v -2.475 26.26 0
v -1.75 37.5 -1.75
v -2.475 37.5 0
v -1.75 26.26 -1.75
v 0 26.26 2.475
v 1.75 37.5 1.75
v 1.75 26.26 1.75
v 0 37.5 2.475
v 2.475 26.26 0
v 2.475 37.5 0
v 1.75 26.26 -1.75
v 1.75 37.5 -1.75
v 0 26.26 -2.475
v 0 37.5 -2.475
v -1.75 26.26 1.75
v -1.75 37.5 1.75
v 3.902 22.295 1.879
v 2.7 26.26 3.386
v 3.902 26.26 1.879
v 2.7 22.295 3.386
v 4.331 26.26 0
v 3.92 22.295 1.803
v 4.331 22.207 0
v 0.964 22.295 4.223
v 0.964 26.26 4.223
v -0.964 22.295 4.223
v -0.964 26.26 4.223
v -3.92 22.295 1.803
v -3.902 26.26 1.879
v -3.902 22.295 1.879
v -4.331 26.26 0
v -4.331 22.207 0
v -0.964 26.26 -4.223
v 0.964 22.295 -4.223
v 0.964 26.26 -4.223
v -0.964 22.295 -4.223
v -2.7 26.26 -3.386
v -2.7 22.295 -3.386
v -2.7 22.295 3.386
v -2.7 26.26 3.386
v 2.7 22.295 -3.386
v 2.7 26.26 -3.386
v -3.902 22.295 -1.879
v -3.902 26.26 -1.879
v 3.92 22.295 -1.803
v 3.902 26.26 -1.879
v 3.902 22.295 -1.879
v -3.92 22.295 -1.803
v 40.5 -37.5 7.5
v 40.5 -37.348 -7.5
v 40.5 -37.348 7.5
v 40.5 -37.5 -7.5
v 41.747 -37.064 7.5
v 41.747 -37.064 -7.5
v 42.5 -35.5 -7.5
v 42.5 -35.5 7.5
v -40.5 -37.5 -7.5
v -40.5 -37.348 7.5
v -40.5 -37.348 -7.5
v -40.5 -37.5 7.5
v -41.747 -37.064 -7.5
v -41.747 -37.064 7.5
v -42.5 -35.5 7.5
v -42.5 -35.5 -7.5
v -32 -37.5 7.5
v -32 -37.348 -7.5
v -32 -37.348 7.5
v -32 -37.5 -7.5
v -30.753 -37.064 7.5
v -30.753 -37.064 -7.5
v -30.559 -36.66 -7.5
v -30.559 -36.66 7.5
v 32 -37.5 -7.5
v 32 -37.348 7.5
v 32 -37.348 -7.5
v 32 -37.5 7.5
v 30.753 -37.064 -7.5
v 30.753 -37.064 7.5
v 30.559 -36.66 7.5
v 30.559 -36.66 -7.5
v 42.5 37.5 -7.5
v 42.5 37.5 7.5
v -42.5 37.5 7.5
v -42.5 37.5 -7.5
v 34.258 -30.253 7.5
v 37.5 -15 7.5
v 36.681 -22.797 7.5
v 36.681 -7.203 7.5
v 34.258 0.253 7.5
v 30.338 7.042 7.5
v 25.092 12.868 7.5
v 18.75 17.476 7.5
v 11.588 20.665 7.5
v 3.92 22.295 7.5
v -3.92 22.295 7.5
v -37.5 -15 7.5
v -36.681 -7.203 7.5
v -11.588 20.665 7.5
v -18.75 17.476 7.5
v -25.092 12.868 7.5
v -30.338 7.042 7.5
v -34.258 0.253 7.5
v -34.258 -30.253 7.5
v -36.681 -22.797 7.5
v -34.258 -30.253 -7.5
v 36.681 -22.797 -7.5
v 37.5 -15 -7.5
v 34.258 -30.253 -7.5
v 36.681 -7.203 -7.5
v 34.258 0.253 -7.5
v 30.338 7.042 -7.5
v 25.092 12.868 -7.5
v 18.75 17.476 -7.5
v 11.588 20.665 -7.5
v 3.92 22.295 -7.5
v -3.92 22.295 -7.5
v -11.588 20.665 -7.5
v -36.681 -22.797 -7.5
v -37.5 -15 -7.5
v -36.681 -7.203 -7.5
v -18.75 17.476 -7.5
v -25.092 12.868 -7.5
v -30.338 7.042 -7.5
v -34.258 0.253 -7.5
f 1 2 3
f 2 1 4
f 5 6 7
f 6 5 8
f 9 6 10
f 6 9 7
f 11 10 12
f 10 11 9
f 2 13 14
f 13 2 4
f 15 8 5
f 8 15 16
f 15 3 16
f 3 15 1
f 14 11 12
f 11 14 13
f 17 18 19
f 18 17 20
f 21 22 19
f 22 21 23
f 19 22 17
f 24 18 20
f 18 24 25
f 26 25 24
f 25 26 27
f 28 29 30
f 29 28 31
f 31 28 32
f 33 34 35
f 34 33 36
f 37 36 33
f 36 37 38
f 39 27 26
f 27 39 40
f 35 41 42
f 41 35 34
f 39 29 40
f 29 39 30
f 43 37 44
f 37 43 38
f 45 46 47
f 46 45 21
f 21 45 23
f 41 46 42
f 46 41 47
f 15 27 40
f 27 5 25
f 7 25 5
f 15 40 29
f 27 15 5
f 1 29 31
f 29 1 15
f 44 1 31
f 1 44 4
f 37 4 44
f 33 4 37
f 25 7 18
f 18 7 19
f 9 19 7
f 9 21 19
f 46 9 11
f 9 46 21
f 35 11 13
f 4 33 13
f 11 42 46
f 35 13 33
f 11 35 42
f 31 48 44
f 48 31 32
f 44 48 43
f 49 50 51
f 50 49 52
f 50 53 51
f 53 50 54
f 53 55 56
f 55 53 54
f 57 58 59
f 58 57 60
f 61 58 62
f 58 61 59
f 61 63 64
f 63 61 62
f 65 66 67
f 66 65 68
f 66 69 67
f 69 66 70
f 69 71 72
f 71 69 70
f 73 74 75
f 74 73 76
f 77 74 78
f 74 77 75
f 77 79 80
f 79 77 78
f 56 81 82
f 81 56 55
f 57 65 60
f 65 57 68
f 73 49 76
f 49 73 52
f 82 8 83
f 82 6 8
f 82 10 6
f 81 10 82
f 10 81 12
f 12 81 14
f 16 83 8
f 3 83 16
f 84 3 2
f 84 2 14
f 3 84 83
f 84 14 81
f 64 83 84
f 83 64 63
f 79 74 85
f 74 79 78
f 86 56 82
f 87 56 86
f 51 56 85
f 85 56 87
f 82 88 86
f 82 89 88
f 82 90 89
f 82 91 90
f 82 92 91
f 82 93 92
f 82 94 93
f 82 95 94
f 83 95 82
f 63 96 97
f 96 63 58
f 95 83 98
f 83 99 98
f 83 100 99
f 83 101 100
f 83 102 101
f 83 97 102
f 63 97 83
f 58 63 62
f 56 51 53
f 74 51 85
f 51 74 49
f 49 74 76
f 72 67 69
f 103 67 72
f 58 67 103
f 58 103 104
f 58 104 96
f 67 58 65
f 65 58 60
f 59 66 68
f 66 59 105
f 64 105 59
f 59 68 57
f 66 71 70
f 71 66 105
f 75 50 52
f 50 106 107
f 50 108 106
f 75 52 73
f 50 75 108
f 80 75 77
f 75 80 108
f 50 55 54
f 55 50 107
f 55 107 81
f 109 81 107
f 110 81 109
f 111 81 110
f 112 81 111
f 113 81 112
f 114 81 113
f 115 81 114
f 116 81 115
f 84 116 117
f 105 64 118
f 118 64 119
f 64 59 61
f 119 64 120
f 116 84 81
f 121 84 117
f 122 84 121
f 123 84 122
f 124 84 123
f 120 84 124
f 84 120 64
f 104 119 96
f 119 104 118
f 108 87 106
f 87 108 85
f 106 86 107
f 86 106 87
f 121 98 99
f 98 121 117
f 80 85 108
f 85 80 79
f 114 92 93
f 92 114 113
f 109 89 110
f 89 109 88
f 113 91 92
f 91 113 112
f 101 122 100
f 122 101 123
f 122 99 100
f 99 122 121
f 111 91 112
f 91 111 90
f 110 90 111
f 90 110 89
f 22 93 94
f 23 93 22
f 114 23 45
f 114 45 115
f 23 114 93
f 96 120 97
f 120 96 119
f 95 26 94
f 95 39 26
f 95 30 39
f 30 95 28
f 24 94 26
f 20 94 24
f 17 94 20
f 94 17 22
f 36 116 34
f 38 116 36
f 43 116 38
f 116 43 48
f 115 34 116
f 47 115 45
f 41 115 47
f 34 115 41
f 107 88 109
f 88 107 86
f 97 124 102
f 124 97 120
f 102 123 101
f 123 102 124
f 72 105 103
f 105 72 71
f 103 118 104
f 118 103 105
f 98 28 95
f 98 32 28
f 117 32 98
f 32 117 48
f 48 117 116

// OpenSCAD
// file: ../../libs/own/mirror_copy.scad
module mirror_copy(v = [1, 0, 0]) {
    children();
    mirror(v) children();
}
// main file
use <../../libs/own/mirror_copy.scad>

schlauch_durchmesser    = 75;

// ein paar berechnete werte ...
basis_laenge            = schlauch_durchmesser + 10;
basis_breite            = 15;
basis_hoehe             = schlauch_durchmesser;
basis_hoehen_versatz    = 15; //ausgewuerfelter wert!

 //etwas laenger damit es auch vollstaendig weg ist
schlauch_laenge         = basis_breite * 1.10;

//ist ja nicht wirklich eine schraube ... aber hier ein paar berechnete werte ...
schrauben_hoehe         = basis_hoehen_versatz;
schrauben_durchmesser   = basis_breite * 0.33;
schrauben_kopf_hoehe    = basis_hoehen_versatz * 0.50;

schraube_plazierung_z = basis_hoehe / -2 - schrauben_kopf_hoehe / 2;

module abrundung(radius = 1) {
    difference() {
        translate([0, - basis_breite * 1.25 / 2, 0]) {
            cube([radius * 1.25, basis_breite * 1.25 , radius * 1.25]);
        }

        rotate([90, 0, 0]) {
            cylinder(h = basis_breite * 1.50, r = radius, center = true);
        }
    }
}

rotate([90, 0, 0]) {
    difference() {
        cube([basis_laenge, basis_breite, basis_hoehe], center=true);

        translate([0, 0, basis_hoehen_versatz]) {
            rotate([90, 0, 0]) {
                cylinder(
                    h = schlauch_laenge,
                    d = schlauch_durchmesser,
                    center = true
                );
            }
        }

        translate([0, 0, schraube_plazierung_z]) {
            union() {
                cylinder(h = schrauben_hoehe, d = schrauben_durchmesser);
                //0.01 um die bohrung etwas sauberer zu haben :)
                translate([0, 0, schrauben_hoehe - 0.01]) {
                    cylinder(h = schrauben_kopf_hoehe, d = schrauben_durchmesser * 1.75);
                }
            }
        }

        //meine version von abgerundeten ecken :)
        radius = 2;
        mirror_copy([1, 0, 0]) {
            translate([basis_laenge / 2 - radius , 0, basis_hoehe / 2 - radius]) {
                abrundung(radius);
            }
        }

        mirror_copy([1, 0, 0]) {
            translate([(sqrt(pow(schlauch_durchmesser / 2, 2) - pow(basis_hoehe / 2 - basis_hoehen_versatz, 2)) + radius) * -1 , 0, basis_hoehe / 2 - radius]) {
                abrundung(2);
            }
        }
    }
}
